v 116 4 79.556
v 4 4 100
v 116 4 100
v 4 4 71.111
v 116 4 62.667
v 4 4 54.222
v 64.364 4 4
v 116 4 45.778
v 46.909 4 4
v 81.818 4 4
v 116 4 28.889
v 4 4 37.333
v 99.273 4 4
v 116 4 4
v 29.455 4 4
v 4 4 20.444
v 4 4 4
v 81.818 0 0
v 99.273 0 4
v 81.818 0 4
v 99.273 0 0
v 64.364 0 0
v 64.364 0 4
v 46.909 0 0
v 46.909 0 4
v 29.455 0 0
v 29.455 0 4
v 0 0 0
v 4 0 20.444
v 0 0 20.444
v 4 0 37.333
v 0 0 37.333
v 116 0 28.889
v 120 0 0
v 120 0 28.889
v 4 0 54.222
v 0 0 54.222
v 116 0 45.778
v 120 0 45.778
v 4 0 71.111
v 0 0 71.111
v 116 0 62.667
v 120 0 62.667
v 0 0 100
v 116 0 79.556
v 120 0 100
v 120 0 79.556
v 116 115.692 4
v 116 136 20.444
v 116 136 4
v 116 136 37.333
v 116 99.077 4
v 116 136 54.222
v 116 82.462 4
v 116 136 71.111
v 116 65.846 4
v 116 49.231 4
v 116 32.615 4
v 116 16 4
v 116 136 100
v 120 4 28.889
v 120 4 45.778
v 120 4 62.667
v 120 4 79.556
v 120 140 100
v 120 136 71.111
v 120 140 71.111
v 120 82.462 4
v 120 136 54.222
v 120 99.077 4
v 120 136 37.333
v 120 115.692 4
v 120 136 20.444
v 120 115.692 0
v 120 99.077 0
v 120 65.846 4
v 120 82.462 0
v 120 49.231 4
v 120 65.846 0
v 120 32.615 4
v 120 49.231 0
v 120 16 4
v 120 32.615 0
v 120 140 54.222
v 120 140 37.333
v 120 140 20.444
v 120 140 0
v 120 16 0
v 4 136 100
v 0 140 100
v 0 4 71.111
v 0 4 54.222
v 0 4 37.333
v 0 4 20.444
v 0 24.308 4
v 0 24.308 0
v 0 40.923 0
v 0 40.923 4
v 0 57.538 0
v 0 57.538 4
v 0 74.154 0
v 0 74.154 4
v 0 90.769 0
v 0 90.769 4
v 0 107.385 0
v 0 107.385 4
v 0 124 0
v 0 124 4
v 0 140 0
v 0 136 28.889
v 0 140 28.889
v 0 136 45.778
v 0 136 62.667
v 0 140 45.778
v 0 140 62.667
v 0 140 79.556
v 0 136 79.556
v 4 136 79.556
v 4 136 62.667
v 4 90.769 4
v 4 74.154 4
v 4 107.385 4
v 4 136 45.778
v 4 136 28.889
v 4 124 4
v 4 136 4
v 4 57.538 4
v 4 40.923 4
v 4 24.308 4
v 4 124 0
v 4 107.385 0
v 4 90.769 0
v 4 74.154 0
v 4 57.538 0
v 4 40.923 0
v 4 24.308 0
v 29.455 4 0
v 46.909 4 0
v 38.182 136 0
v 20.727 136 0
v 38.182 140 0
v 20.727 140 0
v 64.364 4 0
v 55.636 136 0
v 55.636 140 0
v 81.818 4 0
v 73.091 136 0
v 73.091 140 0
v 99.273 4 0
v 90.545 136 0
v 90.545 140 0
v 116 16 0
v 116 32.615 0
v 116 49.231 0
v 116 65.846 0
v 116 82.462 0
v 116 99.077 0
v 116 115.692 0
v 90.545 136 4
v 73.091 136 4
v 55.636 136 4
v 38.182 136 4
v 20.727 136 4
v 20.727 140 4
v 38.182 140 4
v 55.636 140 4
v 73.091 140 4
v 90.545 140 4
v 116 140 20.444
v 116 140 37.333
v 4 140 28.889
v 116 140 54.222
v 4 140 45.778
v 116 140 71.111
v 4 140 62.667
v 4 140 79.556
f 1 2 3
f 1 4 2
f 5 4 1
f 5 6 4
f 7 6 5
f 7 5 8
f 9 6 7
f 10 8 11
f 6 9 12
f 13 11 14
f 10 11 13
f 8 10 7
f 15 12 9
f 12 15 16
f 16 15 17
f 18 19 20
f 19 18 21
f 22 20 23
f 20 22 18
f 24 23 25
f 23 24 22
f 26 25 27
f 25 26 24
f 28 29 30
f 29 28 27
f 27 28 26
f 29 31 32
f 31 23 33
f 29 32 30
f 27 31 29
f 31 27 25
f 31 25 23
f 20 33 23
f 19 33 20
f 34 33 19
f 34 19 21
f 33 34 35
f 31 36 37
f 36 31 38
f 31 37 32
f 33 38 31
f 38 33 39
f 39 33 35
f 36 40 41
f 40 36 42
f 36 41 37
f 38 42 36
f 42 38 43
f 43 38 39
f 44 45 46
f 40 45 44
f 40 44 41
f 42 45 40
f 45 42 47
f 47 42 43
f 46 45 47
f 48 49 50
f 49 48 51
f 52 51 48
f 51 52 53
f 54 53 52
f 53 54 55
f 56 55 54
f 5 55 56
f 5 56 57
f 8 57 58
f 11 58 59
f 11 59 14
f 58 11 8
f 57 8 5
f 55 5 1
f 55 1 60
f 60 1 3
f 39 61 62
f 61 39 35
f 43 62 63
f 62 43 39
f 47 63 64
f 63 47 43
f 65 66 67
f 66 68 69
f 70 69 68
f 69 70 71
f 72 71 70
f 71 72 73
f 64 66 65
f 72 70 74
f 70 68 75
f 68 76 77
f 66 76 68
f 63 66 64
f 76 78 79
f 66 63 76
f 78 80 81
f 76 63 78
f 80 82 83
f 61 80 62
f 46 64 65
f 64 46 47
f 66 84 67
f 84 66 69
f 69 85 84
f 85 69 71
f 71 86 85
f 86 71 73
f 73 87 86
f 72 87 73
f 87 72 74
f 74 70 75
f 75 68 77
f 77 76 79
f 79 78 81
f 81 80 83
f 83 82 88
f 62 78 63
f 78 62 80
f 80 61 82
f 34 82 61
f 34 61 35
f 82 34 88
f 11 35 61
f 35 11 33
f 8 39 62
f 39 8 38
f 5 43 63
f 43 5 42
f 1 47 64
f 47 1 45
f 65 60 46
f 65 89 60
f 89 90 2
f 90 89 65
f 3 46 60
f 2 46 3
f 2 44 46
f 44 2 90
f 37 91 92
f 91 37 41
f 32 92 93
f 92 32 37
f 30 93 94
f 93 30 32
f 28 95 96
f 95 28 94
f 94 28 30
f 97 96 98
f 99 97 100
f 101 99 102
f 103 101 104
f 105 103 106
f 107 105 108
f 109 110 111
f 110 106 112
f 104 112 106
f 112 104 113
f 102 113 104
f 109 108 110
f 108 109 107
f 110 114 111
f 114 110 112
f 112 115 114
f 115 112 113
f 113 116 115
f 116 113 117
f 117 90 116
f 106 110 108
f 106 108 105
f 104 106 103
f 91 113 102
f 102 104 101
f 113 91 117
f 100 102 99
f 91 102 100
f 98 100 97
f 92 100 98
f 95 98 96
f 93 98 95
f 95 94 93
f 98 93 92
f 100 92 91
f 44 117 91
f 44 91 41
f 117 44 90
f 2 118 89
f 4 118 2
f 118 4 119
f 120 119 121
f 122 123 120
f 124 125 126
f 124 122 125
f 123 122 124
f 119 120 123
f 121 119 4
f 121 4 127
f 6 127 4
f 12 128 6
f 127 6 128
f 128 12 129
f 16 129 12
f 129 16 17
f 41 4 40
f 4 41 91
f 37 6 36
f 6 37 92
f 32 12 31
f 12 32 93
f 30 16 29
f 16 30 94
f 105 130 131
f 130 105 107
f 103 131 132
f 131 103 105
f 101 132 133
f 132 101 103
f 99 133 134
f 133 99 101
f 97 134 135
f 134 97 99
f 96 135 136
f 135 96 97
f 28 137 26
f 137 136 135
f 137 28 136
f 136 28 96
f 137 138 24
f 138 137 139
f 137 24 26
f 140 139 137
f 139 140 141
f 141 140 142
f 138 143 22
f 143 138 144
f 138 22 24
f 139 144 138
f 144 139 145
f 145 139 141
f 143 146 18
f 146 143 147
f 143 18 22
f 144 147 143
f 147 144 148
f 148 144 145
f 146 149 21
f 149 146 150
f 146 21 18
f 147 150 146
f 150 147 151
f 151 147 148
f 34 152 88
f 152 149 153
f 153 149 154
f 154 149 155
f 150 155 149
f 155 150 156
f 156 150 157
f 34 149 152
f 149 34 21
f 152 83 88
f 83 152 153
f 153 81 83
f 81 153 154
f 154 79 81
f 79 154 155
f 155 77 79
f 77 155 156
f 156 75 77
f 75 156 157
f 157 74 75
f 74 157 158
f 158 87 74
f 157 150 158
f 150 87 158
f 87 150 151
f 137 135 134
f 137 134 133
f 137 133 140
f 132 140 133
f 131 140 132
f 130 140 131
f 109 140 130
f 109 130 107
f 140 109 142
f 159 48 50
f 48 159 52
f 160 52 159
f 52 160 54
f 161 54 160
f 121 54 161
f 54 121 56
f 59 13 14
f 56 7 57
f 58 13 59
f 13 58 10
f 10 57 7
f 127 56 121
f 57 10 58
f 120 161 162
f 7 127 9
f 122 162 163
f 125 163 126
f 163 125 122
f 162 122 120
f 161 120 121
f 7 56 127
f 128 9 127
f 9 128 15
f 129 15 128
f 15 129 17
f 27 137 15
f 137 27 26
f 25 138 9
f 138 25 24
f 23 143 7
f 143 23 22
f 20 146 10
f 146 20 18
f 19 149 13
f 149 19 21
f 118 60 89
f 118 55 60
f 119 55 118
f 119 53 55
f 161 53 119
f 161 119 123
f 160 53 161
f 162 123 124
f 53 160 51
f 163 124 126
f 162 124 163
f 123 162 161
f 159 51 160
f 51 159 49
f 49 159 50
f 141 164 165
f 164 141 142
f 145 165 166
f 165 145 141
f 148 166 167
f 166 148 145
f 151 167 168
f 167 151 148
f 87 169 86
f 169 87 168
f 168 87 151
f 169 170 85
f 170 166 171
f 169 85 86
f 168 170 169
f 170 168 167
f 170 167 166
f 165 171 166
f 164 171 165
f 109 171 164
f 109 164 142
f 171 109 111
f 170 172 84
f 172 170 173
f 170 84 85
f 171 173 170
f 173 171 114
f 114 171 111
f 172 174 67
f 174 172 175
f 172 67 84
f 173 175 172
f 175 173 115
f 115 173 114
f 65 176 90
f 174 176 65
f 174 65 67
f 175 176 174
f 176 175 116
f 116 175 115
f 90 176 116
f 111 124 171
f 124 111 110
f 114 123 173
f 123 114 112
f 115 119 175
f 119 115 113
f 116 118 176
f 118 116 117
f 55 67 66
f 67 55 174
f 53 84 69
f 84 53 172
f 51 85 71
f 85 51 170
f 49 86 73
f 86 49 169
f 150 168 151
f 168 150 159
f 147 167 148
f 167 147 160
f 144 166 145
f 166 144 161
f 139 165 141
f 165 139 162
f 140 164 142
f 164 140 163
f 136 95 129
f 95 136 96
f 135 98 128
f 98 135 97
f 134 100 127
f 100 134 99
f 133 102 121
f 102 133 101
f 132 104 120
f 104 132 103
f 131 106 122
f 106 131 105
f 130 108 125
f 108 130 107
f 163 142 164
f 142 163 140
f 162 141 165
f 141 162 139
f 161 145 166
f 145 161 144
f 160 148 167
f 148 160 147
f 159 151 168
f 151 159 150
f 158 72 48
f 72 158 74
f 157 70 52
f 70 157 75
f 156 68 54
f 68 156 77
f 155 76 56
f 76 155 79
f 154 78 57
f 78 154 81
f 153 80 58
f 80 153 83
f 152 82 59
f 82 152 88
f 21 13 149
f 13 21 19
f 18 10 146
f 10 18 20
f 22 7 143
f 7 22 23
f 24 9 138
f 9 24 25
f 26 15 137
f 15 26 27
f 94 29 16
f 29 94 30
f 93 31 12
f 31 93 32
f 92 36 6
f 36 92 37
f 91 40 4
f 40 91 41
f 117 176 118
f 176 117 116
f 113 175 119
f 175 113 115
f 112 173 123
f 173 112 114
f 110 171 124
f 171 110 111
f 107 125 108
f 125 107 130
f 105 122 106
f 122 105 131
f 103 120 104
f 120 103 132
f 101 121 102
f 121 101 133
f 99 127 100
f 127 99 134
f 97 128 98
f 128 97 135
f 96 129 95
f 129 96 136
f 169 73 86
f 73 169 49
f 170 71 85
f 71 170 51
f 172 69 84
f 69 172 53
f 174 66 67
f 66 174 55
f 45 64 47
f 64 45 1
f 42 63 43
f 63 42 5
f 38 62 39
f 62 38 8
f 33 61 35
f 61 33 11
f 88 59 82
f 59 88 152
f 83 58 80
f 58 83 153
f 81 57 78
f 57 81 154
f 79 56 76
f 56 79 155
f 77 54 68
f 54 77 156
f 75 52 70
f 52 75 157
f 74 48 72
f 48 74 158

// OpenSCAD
// file: box.scad
// Display options:

explode = 0; // 3d explosion
front_color = "RoyalBlue";
back_color = "RoyalBlue";
bottom_color = "SlateBlue";
top_color = "SlateBlue";
left_color = "MediumAquamarine";
right_color = "MediumAquamarine";

// Cutting options:

kerf = 0.3; // Kerf width (cuts will be offset by half this)
labels = false;

// Examples:

// box(width = 130, height = 150, depth = 170, thickness = 4);
// box(width = 130, height = 150, depth = 170, thickness = 4, open = true, inset = 8);
// lidbox(width = 130, height = 150, depth = 170, thickness = 4);

// box2d();

// Internals:

e = 0.01;
kc = kerf / 2;

module box(width, height, depth, thickness, finger_width, finger_margin,
	   open = false, inset = 0, assemble = false,
     hole_width = false) {
  w = width;
  h = height;
  d = depth;
  t = thickness;
  hm = h - inset;
  fm = (finger_margin == undef) ? thickness * 2 : finger_margin;
  fw = (finger_width == undef) ? thickness * 2 : finger_width;
  keep_top = !open;

  module left() { cut_left() panel2d(d, h); }
  module right() { cut_right() panel2d(d, h); }
  module top() { cut_top() panel2d(w, d); }
  module bottom() { cut_bottom() panel2d(w, d); }
  module back() { cut_back() panel2d(w, h); }
  module front() { cut_front() panel2d(w, h); }

  module front3d() {
    translate([0,t-explode,0])
      rotate(90, [1,0,0])
      panelize(w,h, "Front", front_color)
      front();
  }

  module back3d() {
    translate([w,d-t+explode,0])
      rotate(-90, [1,0,0])
      rotate(180,[0,0,1])
      panelize(w, h, "Back", back_color)
      back();
  }

  module bottom3d() {
    translate([w,0,t-explode])
      rotate(180,[0,1,0])
      panelize(w, d, "Bottom", bottom_color)
      bottom();
  }

  module top3d() {
    translate([0,0,h-t+explode])
      panelize(w, d, "Top", top_color)
      top();
  }

  module left3d() {
    translate([t-explode,d,0])
      rotate(-90,[0,1,0])
      rotate(-90,[0,0,1])
      panelize(d, h, "Left", left_color)
      left();
  }

  module right3d() {
    translate([w-t+explode,0,0])
      rotate(90,[0,1,0])
      rotate(90,[0,0,1])
      panelize(d, h, "Right", right_color)
      right();
  }

  module box2d() {
    compkerf() front();
    x1 = w + kc * 2 + e;
    translate([x1,0]) compkerf() back();
    x2 = x1 + w + 2 * kc + e;
    translate([x2,0]) compkerf() left();
    x3 = x2 + d + 2 * kc + e;
    translate([x3,0]) compkerf() right();
    y1 = h + kc * 2 + e;
    x4 = 0;
    translate([x4,y1]) compkerf() bottom();
    if (keep_top) {
	 x5 = w + 2 * kc + e;
	 translate([x5,y1]) compkerf() top();
    }
  }

  module box3d() {
    front3d(w, h, d);
    back3d(w, h, d);
    translate([0,0,inset]) bottom3d();
    if (keep_top)
      top3d();
    left3d();
    right3d();
  }

  module cut_front() {
    difference() {
      children();
      translate([0,inset]) cuts(w);
      if (keep_top) movecutstop(w, h) cuts(w);
      movecutsleft(w, h) cuts(h);
      movecutsright(w, h) cuts(h);
      if (hole_width) {
	   r = hole_height / 2;
	   hull() {
		translate([w/2 - hole_width/2 + r, h - hole_margin - r])
		     circle(r = r);
		translate([w/2 + hole_width/2 - r, h - hole_margin - r])
		     circle(r = r);
	   }
      }
    }
  }

  module cut_top() {
    difference() {
      children();
      invcuts(w);
      movecutstop(w, d) invcuts(w);
      movecutsleft(w, d) translate([t,0]) invcuts(d-2*t);
      movecutsright(w, d) translate([t,0]) invcuts(d-2*t);
    }
  }

  module cut_left() {
    difference() {
      children();
      translate([t,inset]) cuts(d-2*t);
      if (keep_top) movecutstop(d, h) translate([t,0]) cuts(d-2*t);
      movecutsleft(d, h) invcuts(h);
      movecutsright(d, h) invcuts(h);
    }
  }

  module cut_bottom() { cut_top() children(); }
  module cut_right() { cut_left() children(); }
  module cut_back() { cut_front() children(); }

  module cuts(tw, li = 0, ri = 0) {
    w = tw - li - ri;
    innerw = w - t*2 - 2 * fm;
    tc1 = floor((innerw / fw - 1) / 2);
    tc = (tc1 < 0) ? 0 : tc1;
    steps = tc * 2 + 1;

    fw_fitting = innerw / steps;

    // Use a default finger if we cant fit one within margins
    fw1 = (innerw < fw) ? fw : fw_fitting;
    // Divide length by 3 if we can fit less that 3 fingers
    fw2 = (tw < fw * 3) ? (tw / 3) : fw1;

    stepsize = fw2;

    x = (w - steps * stepsize) / 2;
    fw_minimum = t;

    if (tw >= 3 * fw_minimum) {
      translate([li,0])
	for (i = [0:tc]) {
	  translate([x+i*stepsize*2,-e])
	    square([stepsize, t+e]);
	}
    }
  }

  module movecutstop(w, h) {
    translate([w,h,0])
      rotate(180,[0,0,1])
      children();
  }

  module movecutsleft(w, h) {
    translate([0, h/2])
      rotate(-90, [0,0,1])
      translate([-h/2,0])
      children();
  }

  module movecutsright(w, h) {
    translate([w-t,0])
      rotate(90,[0,0,1])
      translate([0,-t])
      children();
  }

  module invcuts(w, li = 0, ri = 0) {
    difference() {
      translate([-2*e,-e]) square([w+4*e,t+e]);
      cuts(w, li, ri);
    }
  }

  module panelize(x, y, name, cl) {
    color(cl)
      linear_extrude(height = t)
	 children();
    if (labels) {
	 color("Yellow")
	      translate([x/2,y/2,t+1])
	      text(text = name, halign = "center", valign="center");
    }
  }

  module panel2d(x, y) {
    square([x,y]);
  }

  if (assemble)
    box3d();
  else
    box2d();
}


// Kerf compensation modifier
module compkerf() { offset(delta = kc) children(); }
// main file
include <box.scad>
box(width = 120, height = 100, depth = 140, thickness = 4, open = true, assemble = true);
